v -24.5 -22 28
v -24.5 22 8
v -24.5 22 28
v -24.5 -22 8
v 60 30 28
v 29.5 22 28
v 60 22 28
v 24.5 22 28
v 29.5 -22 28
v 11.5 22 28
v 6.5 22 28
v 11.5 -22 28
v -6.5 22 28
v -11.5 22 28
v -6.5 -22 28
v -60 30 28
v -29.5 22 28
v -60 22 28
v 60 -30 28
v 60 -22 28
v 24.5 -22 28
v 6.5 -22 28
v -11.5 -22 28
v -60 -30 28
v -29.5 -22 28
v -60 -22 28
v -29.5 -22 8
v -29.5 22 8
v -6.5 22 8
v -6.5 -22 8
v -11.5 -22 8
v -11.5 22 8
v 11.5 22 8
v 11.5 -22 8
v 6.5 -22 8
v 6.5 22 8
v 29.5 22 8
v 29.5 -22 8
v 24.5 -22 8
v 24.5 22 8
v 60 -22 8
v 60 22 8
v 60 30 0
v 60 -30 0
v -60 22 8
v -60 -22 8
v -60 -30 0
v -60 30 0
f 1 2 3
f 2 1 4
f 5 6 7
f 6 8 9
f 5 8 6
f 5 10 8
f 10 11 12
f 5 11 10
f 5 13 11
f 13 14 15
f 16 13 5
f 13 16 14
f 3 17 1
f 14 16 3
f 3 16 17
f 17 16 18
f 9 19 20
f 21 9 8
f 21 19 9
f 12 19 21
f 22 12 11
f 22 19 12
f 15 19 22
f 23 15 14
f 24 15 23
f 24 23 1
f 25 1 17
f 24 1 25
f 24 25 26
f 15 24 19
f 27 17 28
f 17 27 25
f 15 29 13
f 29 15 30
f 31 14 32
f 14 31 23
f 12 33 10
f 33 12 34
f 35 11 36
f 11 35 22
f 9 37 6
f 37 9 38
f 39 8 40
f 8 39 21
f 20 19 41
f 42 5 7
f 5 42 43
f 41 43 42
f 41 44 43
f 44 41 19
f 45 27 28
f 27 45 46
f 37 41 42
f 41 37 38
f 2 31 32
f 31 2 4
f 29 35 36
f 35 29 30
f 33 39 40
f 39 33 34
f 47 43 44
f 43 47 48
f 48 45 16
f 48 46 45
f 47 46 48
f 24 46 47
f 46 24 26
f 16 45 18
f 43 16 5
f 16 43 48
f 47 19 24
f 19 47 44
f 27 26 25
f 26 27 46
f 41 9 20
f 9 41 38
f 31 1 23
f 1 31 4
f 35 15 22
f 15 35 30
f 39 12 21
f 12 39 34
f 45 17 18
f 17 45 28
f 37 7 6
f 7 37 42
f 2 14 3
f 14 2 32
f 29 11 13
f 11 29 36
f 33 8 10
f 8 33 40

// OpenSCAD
$fn = 32;

// ----------------------------------------------------------------------
// Rib frame 120 x 60 x 28
// 4 ribs at 18 mm pitch
// ----------------------------------------------------------------------

// --- parameters (mm) ---
frame = [120, 60, 8];  // base plate size (x, y, z)
rail_w = 8;            // side rail width
ribs = 4;              // number of ribs
rib_t = 5;             // rib thickness
rib_h = 20;            // rib height above the base plate
pitch = 18;            // pitch between rib centres

// --- derived feature positions (mm) ---
span = (ribs - 1) * pitch;          // = 54   distance between the outer ribs
origin_x = -span / 2;               // = -27   X of the first rib
rib_len = frame[1] - 2 * rail_w + 2;  // = 46   rib length, 1 mm into each rail
feature_centers = [
  [origin_x + 0 * pitch, 0],
  [origin_x + 1 * pitch, 0],
  [origin_x + 2 * pitch, 0],
  [origin_x + 3 * pitch, 0]
];   // rib centre line, drives the rib loop

// base plate, two side rails, then the ribs read straight off feature_centers
union() {
  translate([-frame[0] / 2, -frame[1] / 2, 0]) cube(frame);
  translate([-frame[0] / 2, -frame[1] / 2, 0]) cube([frame[0], rail_w, frame[2] + rib_h]);
  translate([-frame[0] / 2, frame[1] / 2 - rail_w, 0]) cube([frame[0], rail_w, frame[2] + rib_h]);
  for (centre = feature_centers)
    translate([centre[0] - rib_t / 2, centre[1] - rib_len / 2, frame[2] - 1])
      cube([rib_t, rib_len, rib_h + 1]);
}
